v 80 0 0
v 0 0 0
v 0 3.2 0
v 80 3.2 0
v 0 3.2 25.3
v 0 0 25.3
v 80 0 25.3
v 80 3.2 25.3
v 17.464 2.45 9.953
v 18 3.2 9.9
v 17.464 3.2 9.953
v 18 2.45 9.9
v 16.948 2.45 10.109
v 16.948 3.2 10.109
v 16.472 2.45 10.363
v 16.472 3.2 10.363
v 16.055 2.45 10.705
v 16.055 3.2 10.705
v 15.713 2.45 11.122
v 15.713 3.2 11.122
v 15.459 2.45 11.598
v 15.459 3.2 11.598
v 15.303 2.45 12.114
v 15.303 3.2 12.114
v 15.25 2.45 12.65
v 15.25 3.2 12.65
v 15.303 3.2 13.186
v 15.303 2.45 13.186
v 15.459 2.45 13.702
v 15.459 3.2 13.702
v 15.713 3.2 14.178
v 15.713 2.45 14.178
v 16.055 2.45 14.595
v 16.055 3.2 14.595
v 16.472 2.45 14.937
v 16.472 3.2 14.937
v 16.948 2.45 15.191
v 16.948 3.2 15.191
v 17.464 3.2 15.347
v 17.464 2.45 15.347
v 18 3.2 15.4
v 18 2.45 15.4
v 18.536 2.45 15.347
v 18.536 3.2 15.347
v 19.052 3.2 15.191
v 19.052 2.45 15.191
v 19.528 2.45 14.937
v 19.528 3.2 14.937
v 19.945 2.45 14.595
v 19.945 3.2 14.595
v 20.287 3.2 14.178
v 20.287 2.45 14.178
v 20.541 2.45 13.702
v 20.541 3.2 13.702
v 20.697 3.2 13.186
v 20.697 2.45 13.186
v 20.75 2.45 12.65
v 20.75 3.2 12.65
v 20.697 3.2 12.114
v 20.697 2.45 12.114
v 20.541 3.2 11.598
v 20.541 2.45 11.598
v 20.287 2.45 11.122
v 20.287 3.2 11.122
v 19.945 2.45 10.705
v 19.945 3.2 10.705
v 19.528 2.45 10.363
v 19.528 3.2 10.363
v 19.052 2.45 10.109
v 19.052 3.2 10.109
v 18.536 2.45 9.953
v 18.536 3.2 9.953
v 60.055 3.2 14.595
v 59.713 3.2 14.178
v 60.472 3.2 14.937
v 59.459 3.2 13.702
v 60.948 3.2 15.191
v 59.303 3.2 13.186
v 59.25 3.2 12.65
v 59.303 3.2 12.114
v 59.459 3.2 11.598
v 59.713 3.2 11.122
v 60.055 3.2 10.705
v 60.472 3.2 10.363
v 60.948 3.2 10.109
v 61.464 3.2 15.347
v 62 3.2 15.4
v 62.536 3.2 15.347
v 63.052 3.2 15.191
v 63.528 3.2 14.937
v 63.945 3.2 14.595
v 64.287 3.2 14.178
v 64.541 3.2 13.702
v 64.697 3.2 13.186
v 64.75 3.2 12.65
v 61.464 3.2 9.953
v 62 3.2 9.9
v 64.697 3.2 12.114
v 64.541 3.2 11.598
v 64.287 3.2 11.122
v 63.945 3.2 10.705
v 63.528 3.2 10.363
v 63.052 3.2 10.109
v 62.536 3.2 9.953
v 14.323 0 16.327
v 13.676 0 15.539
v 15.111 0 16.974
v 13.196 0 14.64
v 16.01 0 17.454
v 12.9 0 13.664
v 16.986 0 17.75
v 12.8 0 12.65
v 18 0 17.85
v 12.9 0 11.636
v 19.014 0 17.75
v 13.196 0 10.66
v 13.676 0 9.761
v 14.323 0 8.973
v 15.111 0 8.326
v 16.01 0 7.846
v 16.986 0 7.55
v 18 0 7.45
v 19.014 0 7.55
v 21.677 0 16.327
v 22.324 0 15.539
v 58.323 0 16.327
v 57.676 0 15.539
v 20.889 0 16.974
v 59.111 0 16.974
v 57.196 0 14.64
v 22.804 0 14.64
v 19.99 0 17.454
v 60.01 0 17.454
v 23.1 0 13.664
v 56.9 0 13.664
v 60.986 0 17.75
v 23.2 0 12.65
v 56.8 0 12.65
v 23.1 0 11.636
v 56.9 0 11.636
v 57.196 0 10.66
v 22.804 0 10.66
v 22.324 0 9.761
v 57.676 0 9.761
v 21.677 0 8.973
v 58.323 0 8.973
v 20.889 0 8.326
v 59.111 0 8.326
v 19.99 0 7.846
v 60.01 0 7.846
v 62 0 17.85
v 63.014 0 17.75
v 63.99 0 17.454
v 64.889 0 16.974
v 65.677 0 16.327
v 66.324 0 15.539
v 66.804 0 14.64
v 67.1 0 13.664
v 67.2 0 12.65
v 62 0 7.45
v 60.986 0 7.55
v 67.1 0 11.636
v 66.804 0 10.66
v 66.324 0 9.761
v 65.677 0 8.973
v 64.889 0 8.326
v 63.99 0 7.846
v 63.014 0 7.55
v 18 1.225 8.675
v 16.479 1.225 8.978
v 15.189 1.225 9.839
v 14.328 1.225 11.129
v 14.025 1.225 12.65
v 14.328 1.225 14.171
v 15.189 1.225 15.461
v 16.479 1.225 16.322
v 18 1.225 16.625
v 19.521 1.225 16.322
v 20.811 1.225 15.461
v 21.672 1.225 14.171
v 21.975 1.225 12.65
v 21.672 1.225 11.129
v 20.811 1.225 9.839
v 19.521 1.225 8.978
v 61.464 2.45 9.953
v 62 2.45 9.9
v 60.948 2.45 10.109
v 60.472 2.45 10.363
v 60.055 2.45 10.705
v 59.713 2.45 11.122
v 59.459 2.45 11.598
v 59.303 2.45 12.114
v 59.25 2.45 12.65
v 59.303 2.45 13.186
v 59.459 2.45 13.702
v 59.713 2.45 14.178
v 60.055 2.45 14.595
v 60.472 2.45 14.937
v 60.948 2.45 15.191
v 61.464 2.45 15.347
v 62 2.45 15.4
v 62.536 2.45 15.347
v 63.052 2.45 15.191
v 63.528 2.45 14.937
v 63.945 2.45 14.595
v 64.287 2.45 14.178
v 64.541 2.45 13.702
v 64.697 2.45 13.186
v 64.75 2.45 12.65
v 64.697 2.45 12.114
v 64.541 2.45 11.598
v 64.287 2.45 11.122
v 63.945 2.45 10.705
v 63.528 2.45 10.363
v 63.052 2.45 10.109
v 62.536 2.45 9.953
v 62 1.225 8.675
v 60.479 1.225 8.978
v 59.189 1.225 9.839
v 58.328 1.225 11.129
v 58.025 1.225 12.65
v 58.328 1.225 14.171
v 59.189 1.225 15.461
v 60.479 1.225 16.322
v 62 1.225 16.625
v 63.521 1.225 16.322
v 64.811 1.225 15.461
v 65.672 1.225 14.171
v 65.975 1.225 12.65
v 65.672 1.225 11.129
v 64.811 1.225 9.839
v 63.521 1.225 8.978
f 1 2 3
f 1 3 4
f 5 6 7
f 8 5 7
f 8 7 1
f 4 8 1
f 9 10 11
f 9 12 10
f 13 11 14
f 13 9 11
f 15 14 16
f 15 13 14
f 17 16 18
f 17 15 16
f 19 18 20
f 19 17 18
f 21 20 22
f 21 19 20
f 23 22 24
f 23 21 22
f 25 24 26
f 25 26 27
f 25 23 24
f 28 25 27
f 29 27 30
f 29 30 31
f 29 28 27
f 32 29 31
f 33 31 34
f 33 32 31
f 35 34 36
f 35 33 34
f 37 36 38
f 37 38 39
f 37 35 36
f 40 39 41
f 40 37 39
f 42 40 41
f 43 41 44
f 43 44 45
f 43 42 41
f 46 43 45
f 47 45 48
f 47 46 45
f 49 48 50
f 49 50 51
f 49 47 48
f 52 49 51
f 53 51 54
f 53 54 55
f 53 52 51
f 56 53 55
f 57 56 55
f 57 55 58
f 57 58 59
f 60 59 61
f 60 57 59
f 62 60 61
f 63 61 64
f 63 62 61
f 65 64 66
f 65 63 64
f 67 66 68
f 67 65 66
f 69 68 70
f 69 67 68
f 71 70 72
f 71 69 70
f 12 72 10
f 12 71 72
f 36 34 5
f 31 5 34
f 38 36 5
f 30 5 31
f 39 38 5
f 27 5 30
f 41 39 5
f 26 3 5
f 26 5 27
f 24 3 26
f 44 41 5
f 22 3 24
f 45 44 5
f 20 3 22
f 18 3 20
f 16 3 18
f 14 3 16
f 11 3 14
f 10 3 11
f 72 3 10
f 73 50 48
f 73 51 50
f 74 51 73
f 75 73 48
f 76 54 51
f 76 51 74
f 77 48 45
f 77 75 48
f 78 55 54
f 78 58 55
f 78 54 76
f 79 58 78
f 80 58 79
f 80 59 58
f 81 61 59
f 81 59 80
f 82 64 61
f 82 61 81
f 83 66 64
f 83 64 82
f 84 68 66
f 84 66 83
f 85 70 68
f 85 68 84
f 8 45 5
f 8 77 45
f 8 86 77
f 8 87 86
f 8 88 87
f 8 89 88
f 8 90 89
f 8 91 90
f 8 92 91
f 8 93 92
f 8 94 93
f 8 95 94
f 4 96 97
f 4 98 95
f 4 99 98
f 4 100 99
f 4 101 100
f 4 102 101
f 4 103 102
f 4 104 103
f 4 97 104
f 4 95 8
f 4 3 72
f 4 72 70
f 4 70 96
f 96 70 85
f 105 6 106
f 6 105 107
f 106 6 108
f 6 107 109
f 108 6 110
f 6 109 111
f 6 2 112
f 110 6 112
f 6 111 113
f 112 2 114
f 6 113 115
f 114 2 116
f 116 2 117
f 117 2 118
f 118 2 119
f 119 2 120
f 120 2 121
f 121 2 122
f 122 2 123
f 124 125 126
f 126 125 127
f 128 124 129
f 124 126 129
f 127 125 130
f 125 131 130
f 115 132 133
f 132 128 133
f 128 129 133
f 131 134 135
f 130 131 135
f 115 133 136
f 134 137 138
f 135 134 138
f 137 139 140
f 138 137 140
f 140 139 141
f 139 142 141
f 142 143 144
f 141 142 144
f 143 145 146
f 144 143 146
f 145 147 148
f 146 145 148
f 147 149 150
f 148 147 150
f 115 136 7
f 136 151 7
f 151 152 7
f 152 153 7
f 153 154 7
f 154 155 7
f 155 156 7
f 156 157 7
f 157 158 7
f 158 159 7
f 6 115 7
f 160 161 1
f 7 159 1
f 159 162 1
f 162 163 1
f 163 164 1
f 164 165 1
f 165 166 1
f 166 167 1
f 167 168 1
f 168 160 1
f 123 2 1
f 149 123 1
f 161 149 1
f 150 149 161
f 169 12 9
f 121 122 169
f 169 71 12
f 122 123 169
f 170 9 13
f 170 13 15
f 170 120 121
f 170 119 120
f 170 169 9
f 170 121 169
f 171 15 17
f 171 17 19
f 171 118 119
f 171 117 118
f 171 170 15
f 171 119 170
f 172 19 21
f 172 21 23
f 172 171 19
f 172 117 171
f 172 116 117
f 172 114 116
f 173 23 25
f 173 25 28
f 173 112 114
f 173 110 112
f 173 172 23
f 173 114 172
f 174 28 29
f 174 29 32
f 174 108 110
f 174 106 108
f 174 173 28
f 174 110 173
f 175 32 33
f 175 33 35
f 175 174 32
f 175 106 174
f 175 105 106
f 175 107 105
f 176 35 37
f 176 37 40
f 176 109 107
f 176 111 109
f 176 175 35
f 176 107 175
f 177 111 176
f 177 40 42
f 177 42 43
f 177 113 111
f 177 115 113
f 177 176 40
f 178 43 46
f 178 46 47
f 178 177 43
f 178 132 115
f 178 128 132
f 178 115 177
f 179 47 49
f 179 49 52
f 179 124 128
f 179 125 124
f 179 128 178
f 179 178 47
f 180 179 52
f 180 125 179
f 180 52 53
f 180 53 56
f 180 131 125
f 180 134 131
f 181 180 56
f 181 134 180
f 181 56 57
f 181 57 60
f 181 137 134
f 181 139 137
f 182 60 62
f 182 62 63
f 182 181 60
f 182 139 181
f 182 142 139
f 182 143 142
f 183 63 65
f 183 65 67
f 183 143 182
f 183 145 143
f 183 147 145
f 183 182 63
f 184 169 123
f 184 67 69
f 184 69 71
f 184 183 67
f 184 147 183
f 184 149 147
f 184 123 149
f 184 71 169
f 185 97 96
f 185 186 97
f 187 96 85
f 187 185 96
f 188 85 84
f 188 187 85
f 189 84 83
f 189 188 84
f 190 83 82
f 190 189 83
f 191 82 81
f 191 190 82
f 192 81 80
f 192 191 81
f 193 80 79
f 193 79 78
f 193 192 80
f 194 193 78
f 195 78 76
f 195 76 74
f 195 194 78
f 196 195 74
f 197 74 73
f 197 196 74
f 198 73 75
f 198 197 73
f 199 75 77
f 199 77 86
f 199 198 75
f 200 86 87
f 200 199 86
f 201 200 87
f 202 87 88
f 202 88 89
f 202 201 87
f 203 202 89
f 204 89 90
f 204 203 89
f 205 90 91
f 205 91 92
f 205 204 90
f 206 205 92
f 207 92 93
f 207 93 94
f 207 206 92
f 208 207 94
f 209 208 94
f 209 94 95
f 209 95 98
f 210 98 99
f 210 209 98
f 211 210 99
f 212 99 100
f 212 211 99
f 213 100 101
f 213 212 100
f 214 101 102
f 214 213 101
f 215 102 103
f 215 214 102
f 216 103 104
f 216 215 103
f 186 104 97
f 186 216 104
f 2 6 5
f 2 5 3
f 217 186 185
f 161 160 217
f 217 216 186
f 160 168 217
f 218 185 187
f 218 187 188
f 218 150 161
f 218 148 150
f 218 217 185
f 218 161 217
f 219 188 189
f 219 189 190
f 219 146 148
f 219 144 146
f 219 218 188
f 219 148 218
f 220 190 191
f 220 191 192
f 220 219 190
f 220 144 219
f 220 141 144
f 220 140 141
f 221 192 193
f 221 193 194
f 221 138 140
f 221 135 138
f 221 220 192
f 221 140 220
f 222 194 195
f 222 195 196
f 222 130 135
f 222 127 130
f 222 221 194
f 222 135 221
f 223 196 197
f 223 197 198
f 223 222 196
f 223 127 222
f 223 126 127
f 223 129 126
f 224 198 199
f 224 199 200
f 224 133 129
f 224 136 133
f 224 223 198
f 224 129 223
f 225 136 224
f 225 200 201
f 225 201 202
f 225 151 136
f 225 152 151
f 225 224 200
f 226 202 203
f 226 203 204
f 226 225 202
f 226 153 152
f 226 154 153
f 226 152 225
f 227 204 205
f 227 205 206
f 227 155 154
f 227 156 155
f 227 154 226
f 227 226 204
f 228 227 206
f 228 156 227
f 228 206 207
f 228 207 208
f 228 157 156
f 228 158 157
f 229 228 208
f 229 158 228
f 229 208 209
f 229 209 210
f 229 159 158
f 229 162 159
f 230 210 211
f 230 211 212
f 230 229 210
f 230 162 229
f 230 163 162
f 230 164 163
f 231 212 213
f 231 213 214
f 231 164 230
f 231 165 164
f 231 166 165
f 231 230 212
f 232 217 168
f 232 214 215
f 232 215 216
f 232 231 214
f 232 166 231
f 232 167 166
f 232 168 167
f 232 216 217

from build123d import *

# Parameters (mm, degrees)
SKETCH1_W                                      = 80
SKETCH1_H                                      = 25.3
BOSS_EXTRUDE1_DEPTH                            = 3.2
CSK_FOR_M5_FLAT_HEAD_MACHINE_SCREW1_AT_2_COUNT = 2
CSK_FOR_M5_FLAT_HEAD_MACHINE_SCREW1_AT_2_PITCH = 44


with BuildPart() as part:
    # Sketch1 → Boss-Extrude1 (new body)
    with BuildSketch(Plane(origin=(0, 0, 0), x_dir=(1, 0, 0), z_dir=(0, 1, 0))):
        with Locations((40, -12.65)):
            Rectangle(SKETCH1_W, SKETCH1_H)
    extrude(amount=BOSS_EXTRUDE1_DEPTH)

    # Sketch3 → CSK for M5 Flat Head Machine Screw1 (revolve, cut)
    with BuildSketch(Plane(origin=(62, 0, 12.65), x_dir=(0, 0, -1), z_dir=(1, 0, 0))):
        Polygon((0, 0), (0, 3.2), (2.75, 3.2), (2.75, 2.45), (5.2, 0), align=None)
    csk_for_m5_flat_head_machine_screw1 = revolve(axis=Axis((62, -6.35, 12.65), (0, 1, 0)), mode=Mode.SUBTRACT)

    # CSK for M5 Flat Head Machine Screw1 at 2: CSK for M5 Flat Head Machine Screw1 ×2
    with Locations(*[(-i * CSK_FOR_M5_FLAT_HEAD_MACHINE_SCREW1_AT_2_PITCH, 0, 0) for i in range(1, CSK_FOR_M5_FLAT_HEAD_MACHINE_SCREW1_AT_2_COUNT)]):
        add(csk_for_m5_flat_head_machine_screw1, mode=Mode.SUBTRACT)


solid = part.part
